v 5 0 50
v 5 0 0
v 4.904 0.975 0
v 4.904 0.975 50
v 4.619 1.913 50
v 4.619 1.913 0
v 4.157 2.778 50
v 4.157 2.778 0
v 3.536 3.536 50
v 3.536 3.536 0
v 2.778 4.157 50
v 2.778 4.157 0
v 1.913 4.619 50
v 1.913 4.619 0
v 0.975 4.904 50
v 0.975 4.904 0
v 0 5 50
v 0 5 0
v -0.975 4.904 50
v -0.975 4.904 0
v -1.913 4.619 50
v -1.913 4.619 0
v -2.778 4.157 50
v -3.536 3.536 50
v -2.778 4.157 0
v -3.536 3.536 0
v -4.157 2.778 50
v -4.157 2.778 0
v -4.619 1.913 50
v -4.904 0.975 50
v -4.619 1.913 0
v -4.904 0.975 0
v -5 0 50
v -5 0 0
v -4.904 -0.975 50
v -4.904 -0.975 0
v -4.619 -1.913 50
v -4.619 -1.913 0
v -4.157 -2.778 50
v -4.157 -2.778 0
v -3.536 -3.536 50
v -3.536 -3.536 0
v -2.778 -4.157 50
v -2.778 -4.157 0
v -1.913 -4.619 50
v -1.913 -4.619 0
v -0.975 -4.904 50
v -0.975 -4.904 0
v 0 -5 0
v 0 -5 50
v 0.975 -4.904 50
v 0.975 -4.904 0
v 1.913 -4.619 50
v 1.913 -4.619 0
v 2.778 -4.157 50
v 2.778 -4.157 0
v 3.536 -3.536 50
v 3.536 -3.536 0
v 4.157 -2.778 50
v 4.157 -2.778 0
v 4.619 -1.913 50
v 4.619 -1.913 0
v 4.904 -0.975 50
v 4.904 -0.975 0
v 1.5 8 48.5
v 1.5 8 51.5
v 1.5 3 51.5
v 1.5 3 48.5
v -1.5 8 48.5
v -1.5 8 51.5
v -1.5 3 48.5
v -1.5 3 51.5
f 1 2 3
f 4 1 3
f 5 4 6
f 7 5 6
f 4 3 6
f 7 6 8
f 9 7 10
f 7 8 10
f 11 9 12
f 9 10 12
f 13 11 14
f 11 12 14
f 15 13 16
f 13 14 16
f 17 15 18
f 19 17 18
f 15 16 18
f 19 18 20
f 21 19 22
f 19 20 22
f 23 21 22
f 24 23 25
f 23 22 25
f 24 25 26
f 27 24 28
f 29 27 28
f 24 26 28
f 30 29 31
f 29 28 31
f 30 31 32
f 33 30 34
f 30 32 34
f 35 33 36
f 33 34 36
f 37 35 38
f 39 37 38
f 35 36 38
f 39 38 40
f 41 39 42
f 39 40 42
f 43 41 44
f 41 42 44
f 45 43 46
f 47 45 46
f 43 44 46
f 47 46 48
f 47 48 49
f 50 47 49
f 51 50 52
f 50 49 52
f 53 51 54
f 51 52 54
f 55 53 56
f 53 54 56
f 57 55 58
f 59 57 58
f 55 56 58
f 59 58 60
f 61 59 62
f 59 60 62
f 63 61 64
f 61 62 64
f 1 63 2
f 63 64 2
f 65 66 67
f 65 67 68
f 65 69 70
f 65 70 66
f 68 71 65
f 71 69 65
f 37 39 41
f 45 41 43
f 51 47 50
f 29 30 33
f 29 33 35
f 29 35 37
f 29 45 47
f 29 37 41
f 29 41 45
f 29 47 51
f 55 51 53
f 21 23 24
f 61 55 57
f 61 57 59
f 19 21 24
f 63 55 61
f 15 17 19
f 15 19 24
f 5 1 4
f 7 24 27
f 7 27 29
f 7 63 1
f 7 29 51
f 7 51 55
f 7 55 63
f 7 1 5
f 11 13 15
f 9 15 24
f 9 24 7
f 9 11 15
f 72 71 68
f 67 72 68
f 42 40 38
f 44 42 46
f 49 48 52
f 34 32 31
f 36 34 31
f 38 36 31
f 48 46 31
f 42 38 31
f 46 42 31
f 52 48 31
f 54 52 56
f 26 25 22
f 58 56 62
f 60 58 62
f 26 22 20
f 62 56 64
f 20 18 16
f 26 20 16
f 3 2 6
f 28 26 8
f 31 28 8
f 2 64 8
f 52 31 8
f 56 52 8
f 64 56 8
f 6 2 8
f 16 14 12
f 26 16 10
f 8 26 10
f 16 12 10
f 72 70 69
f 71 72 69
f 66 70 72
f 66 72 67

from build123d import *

# Parameters (mm, degrees)
SKIZZE1_R                            = 5
AUFSATZ_LINEAR_AUSTRAGEN1_DEPTH      = 50
SKIZZE8_W                            = 3
SKIZZE8_H                            = 3
AUFSATZ_LINEAR_AUSTRAGEN3_DEPTH      = 3
AUFSATZ_LINEAR_AUSTRAGEN3_DEPTH_BACK = 2


with BuildPart() as part:
    # Skizze1 → Aufsatz-Linear austragen1 (new body)
    with BuildSketch(Plane.XY):
        Circle(SKIZZE1_R)
    extrude(amount=AUFSATZ_LINEAR_AUSTRAGEN1_DEPTH)


with BuildPart() as body_2:
    # Skizze8 → Aufsatz-Linear austragen3 (new body, two sides)
    with BuildSketch(Plane(origin=(0, 5, 0), x_dir=(1, 0, 0), z_dir=(0, 1, 0))) as aufsatz_linear_austragen3_sk:
        with Locations((0, -50)):
            Rectangle(SKIZZE8_W, SKIZZE8_H)
    extrude(amount=AUFSATZ_LINEAR_AUSTRAGEN3_DEPTH)
    extrude(aufsatz_linear_austragen3_sk.sketch, amount=-AUFSATZ_LINEAR_AUSTRAGEN3_DEPTH_BACK)


solid = Compound([part.part, body_2.part])
